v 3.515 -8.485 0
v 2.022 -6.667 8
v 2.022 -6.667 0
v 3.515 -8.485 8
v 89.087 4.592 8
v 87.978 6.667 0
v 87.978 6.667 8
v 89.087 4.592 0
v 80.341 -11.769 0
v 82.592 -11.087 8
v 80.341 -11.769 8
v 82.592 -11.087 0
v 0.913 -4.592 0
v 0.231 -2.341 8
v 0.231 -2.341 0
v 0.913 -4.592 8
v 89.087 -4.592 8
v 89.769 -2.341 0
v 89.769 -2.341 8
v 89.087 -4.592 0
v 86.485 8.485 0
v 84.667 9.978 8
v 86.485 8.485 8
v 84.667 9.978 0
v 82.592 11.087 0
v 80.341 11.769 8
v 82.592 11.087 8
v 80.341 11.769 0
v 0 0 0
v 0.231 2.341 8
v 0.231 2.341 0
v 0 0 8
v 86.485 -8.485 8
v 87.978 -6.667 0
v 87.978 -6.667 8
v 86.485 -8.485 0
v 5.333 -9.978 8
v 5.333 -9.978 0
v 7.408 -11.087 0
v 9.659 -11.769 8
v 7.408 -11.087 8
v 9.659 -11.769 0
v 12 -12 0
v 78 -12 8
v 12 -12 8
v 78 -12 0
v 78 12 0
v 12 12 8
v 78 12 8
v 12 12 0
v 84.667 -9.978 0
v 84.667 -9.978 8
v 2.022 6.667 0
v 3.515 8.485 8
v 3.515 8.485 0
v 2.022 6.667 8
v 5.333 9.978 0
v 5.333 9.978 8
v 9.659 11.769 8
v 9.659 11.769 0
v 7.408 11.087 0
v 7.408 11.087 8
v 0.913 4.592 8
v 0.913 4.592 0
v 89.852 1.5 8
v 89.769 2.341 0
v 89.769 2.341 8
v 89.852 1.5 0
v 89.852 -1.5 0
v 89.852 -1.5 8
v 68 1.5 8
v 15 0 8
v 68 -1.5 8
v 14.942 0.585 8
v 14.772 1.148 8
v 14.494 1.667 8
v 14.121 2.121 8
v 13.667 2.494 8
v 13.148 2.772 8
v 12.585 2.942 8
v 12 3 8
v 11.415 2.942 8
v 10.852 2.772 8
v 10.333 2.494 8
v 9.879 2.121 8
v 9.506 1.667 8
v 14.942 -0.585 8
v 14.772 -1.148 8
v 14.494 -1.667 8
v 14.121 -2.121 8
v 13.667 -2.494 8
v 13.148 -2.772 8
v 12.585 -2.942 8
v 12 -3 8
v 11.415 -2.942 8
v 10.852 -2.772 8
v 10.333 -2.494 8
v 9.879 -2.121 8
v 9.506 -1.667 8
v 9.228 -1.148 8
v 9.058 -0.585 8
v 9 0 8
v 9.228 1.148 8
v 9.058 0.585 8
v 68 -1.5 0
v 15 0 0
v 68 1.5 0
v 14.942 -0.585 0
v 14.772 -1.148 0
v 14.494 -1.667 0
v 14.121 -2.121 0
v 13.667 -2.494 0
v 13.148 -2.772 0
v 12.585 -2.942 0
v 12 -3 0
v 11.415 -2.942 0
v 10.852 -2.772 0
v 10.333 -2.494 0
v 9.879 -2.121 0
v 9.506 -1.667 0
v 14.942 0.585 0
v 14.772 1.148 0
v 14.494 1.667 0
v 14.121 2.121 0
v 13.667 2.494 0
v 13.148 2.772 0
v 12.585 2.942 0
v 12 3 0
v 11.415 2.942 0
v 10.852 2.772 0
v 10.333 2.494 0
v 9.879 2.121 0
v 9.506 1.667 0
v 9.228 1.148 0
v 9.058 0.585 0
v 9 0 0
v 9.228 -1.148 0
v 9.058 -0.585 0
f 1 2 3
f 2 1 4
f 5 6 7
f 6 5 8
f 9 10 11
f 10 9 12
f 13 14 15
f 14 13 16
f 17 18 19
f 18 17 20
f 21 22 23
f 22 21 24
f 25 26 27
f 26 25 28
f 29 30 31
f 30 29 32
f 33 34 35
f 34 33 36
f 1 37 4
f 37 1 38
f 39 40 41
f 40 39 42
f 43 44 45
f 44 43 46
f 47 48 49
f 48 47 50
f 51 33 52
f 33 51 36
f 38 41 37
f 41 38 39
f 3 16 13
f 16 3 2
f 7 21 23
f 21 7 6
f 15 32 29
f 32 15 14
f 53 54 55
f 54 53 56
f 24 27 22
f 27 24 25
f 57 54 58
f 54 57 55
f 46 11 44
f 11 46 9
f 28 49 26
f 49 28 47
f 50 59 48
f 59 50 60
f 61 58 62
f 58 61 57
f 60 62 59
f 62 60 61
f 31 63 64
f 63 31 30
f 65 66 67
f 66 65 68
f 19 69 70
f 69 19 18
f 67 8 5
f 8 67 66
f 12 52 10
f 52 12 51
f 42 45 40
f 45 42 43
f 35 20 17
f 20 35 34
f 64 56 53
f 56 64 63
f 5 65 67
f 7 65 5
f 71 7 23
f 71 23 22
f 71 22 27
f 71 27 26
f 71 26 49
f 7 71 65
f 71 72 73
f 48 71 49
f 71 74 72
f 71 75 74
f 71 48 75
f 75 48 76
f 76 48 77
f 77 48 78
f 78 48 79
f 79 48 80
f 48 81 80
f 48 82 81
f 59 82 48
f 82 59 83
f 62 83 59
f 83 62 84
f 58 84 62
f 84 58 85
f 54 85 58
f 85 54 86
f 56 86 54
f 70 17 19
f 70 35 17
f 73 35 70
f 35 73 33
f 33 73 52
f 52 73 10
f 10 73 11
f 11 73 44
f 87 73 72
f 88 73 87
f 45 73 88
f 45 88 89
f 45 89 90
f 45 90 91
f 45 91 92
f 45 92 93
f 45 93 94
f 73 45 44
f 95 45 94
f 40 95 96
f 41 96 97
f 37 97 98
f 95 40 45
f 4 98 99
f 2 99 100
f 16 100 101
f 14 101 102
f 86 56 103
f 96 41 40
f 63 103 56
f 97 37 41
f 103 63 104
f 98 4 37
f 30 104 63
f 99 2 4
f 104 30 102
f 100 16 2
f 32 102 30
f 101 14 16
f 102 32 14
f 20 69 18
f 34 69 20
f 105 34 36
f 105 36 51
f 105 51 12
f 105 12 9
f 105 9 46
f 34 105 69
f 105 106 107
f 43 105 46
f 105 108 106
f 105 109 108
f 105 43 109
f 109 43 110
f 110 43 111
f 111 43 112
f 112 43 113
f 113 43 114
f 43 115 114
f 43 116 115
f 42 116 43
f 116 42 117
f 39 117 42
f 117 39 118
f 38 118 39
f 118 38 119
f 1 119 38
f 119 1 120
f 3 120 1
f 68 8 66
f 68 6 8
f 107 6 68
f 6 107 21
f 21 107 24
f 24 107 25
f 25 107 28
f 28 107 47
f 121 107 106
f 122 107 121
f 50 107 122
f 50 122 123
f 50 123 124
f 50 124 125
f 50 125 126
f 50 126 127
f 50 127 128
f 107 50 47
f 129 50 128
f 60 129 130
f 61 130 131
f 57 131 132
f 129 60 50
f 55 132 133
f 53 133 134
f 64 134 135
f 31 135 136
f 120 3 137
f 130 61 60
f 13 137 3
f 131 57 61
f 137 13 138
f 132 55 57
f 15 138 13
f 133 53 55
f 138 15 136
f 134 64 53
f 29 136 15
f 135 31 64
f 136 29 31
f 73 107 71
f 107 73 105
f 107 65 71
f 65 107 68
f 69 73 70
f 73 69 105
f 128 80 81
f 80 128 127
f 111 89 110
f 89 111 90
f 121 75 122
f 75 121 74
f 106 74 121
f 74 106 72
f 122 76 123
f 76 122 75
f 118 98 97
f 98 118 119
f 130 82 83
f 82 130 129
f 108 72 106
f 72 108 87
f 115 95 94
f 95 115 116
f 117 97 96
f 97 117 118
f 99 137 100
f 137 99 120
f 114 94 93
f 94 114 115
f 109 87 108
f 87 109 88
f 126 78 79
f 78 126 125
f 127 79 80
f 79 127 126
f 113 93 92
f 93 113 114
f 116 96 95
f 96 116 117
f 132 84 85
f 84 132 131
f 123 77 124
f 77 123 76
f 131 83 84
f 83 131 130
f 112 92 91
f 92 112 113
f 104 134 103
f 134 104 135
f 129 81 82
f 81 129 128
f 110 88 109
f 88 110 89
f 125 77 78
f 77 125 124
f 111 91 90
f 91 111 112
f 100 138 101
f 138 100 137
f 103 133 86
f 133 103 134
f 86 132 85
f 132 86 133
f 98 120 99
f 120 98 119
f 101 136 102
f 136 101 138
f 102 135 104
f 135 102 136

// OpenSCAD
// Key turner: a lever handle that grips a house key head so a person with limited grip
// strength can turn it. Class A standalone part. Licence: CC0 1.0. Authored for the michani
// demo, 2026, from scratch; the part family follows the Makers Making Change low-tech
// assistive devices kit.

// Length of the lever handle
handle_length = 90; // [60:140]
// Width of the handle
handle_width = 24; // [16:40]
// Thickness of the handle and the key slot walls
thickness = 8; // [5:14]
// Width of the slot that holds the key head
key_slot_width = 3; // [2:5]
// Depth of the key slot from the handle end
key_slot_depth = 22; // [12:35]

$fn = 32;

module handle_body() {
  // A rounded bar: two cylinders hulled so the grip has no sharp corners.
  hull() {
    translate([handle_width / 2, 0, 0]) cylinder(h = thickness, d = handle_width);
    translate([handle_length - handle_width / 2, 0, 0]) cylinder(h = thickness, d = handle_width);
  }
}

module key_slot() {
  // The slot enters from the handle end and stops before the thumb area, with a small
  // extra depth so the key head seats fully.
  translate([handle_length - key_slot_depth, -key_slot_width / 2, -1])
    cube([key_slot_depth + 1, key_slot_width, thickness + 2]);
}

module finger_hole() {
  // A hole at the free end lets the turner hang on a hook or a lanyard.
  translate([handle_width / 2, 0, -1]) cylinder(h = thickness + 2, d = 6);
}

difference() {
  handle_body();
  key_slot();
  finger_hole();
}
